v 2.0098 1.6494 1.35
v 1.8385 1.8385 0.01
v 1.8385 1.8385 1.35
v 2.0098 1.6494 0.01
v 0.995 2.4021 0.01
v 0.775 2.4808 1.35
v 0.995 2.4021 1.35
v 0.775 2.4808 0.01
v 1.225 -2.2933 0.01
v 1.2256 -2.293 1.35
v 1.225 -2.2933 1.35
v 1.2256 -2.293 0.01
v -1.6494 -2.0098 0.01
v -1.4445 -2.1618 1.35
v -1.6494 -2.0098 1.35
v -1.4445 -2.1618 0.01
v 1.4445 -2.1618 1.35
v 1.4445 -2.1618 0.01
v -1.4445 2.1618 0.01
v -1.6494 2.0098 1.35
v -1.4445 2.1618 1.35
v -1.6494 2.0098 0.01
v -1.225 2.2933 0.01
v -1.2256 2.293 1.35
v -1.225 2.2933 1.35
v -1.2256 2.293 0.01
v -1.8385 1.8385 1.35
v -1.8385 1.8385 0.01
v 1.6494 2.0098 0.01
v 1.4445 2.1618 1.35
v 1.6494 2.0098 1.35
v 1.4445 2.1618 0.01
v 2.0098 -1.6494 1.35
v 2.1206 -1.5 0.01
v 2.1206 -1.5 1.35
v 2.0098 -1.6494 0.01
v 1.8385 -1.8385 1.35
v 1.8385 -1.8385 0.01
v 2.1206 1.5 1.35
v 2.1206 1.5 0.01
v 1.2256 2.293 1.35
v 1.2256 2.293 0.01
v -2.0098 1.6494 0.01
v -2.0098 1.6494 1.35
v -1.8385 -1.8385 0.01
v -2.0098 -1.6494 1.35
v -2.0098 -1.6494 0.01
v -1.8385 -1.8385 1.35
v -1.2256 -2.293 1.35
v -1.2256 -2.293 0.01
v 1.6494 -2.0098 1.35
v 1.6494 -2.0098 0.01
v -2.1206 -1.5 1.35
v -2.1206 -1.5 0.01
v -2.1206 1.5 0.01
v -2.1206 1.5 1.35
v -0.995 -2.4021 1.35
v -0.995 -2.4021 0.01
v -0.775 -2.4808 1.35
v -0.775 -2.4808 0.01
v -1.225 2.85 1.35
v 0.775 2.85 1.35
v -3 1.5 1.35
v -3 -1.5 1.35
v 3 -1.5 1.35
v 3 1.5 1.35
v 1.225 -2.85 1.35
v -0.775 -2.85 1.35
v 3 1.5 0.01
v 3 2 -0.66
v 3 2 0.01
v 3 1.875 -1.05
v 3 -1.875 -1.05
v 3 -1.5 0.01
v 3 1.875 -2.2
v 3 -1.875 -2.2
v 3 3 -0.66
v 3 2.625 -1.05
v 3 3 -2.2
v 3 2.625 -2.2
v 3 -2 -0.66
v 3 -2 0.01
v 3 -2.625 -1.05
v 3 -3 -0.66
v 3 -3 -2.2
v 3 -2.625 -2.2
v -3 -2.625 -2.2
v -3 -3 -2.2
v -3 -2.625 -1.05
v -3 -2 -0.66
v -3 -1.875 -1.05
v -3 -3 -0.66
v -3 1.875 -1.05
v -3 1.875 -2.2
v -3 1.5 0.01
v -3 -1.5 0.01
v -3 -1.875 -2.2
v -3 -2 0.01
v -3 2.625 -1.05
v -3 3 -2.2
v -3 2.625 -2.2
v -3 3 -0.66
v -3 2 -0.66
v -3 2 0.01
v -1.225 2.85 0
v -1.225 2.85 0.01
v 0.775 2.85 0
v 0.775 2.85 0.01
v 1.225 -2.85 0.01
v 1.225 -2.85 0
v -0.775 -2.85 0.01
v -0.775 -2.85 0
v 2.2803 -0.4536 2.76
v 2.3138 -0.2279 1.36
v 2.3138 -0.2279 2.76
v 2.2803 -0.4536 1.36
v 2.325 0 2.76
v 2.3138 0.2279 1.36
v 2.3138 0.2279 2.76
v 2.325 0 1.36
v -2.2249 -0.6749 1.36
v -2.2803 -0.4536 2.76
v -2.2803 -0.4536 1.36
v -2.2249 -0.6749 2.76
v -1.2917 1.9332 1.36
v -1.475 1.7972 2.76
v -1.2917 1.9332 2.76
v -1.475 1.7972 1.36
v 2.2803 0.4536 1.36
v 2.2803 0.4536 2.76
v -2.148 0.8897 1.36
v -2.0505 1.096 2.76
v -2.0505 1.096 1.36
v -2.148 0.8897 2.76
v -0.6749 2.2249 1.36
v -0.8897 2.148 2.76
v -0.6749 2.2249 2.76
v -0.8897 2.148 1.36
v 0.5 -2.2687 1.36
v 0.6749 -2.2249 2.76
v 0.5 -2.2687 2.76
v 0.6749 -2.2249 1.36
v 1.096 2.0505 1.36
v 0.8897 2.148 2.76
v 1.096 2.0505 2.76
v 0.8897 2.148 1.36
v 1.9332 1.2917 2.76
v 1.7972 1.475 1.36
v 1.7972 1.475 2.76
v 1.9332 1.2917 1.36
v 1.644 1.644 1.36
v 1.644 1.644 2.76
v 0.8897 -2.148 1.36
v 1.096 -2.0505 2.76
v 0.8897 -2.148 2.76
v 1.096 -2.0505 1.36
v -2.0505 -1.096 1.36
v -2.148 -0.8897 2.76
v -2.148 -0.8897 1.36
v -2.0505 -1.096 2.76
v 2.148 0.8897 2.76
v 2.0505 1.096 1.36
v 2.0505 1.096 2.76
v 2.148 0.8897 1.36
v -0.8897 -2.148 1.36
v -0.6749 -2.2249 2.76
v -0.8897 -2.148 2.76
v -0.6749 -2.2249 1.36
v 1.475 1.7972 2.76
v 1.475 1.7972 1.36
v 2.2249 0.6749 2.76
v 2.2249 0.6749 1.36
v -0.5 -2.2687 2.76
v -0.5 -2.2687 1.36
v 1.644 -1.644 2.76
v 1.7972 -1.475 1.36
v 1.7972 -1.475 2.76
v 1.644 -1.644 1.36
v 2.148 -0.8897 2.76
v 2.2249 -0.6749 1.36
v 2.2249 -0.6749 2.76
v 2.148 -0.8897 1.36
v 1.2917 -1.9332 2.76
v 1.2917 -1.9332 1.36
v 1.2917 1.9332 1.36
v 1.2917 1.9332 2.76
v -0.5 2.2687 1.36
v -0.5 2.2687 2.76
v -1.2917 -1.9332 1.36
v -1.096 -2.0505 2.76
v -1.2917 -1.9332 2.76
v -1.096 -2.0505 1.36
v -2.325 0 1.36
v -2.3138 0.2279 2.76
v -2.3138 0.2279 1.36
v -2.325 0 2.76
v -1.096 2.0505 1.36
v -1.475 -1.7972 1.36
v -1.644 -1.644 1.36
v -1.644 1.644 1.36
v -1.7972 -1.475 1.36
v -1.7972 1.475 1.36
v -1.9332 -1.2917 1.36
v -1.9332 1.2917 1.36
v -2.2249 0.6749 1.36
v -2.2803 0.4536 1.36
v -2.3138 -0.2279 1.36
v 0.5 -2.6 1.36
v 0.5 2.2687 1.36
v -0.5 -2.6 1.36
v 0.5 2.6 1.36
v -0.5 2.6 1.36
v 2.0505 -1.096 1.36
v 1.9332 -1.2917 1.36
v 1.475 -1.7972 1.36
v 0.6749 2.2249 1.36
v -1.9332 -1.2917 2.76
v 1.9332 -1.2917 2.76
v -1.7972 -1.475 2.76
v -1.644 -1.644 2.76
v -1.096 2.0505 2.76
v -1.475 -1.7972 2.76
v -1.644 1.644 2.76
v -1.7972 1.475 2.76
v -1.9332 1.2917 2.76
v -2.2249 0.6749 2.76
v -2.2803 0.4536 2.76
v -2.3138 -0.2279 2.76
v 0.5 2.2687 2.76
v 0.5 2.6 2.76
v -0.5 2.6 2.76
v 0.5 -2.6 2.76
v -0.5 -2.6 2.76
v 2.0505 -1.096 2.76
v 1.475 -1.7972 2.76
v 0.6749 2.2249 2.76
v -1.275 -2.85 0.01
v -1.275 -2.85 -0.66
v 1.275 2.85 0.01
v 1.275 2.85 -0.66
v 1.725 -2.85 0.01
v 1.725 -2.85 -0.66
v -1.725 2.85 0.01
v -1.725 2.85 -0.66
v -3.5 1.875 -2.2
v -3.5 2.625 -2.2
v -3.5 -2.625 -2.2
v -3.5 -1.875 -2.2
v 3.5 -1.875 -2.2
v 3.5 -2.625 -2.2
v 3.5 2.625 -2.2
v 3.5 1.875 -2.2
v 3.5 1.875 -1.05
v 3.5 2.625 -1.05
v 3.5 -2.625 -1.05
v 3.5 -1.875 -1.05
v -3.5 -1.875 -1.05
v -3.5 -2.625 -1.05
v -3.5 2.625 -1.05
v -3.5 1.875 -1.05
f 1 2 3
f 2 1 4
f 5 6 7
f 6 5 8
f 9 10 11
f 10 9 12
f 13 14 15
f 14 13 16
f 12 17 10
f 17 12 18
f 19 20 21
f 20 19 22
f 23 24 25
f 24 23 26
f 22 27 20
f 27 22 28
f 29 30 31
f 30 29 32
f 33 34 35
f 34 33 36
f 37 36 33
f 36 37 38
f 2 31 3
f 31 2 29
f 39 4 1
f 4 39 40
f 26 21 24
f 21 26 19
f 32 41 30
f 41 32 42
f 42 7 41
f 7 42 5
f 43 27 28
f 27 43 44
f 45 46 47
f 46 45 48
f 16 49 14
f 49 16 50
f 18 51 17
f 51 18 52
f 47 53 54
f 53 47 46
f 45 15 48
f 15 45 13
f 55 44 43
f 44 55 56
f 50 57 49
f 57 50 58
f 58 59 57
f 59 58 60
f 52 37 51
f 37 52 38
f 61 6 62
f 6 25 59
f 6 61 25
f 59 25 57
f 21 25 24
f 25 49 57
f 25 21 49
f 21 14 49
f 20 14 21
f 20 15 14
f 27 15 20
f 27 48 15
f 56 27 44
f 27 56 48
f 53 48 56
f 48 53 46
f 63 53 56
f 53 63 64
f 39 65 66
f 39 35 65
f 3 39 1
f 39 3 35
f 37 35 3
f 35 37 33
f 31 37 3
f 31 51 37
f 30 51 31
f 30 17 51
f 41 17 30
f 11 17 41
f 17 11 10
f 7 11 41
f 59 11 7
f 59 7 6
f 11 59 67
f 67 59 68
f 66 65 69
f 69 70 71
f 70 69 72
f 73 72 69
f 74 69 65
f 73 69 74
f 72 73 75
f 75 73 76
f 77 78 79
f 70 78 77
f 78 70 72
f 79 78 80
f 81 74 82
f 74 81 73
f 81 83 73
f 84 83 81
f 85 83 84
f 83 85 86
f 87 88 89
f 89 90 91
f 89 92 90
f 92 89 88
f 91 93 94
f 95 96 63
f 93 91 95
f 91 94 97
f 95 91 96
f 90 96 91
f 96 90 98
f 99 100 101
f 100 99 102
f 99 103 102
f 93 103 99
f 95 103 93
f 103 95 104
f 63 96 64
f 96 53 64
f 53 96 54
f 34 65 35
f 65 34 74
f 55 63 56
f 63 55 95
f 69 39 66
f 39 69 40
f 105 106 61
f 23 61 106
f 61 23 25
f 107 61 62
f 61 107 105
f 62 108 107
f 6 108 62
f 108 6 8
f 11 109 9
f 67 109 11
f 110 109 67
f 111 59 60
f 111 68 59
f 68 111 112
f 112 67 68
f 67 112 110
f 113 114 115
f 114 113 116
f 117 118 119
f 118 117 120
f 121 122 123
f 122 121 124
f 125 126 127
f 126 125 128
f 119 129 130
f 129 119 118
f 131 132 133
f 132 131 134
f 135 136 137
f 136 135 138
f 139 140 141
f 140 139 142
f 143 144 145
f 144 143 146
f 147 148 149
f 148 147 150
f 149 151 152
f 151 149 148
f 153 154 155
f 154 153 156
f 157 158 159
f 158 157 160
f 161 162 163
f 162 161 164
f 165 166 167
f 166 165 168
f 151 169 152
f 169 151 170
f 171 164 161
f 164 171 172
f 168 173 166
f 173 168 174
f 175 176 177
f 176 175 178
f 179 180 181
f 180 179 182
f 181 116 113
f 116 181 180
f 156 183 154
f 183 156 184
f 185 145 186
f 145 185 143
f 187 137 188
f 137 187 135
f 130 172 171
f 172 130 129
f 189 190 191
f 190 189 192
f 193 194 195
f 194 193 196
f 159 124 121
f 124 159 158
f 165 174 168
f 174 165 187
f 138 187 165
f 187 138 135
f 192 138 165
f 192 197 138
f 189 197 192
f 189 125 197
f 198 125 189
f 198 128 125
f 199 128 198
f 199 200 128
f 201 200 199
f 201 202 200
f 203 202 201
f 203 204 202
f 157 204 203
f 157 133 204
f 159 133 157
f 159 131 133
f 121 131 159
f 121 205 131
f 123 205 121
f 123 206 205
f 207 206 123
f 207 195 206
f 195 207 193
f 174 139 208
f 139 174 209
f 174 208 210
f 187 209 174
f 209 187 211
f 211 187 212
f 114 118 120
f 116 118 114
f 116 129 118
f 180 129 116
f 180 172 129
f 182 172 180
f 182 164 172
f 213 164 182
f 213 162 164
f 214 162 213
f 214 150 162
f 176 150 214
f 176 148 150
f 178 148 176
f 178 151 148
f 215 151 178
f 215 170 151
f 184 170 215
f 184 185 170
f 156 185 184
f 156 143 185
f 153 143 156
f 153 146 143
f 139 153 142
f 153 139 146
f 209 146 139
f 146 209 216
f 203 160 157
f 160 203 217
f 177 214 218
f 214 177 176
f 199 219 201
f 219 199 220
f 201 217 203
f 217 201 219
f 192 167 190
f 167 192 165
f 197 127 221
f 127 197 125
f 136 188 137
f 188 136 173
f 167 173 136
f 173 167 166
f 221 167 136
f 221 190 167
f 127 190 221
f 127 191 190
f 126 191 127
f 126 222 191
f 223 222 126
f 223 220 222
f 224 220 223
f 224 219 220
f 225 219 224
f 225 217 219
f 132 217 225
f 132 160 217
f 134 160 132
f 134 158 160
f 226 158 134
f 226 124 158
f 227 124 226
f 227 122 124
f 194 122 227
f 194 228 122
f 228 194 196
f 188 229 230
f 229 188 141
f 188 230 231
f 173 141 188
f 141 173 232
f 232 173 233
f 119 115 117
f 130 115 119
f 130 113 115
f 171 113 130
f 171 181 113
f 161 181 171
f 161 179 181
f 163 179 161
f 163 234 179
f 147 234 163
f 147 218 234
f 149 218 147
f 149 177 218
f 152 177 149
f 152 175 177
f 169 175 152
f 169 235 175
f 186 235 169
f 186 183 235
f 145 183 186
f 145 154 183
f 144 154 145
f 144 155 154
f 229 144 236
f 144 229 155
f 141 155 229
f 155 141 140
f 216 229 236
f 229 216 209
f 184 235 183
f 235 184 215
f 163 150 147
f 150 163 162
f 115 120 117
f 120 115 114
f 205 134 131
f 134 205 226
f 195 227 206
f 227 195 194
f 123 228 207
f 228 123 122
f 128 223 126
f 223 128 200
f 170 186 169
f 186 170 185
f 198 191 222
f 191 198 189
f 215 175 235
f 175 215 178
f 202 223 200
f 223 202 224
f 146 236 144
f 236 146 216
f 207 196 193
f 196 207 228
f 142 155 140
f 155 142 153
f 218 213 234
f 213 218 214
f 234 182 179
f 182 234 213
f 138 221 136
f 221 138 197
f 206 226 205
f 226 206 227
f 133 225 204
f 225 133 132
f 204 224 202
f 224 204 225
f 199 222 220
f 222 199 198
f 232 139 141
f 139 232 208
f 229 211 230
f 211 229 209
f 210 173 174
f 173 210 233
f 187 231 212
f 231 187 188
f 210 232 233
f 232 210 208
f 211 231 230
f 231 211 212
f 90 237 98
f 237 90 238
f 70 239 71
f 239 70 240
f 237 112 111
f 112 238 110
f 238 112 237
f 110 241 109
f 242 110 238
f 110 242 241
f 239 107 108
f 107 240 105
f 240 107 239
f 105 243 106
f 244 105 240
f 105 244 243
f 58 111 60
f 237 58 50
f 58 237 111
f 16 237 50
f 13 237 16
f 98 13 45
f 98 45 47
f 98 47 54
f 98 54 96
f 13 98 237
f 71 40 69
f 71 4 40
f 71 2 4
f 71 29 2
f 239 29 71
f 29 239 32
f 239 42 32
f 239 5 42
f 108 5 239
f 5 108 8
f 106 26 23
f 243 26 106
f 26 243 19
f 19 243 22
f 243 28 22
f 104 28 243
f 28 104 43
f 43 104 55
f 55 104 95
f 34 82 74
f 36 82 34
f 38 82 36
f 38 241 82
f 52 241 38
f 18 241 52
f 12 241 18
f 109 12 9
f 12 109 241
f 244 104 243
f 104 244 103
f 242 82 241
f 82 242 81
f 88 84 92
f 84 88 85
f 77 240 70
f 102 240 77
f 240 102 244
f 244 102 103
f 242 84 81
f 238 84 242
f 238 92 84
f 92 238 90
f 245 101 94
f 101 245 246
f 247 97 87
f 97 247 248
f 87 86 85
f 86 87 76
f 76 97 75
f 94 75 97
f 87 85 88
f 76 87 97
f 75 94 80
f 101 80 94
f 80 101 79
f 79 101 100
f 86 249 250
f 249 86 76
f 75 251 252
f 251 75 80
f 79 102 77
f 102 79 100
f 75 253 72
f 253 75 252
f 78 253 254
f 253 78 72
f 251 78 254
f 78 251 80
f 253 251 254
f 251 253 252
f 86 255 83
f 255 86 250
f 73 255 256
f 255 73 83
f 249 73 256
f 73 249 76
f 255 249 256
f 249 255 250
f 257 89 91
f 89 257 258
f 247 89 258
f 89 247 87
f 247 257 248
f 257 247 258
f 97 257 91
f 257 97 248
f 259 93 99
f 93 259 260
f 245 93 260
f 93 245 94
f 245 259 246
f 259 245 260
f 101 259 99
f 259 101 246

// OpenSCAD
// Start: lazy_union
default_5_default_5();
// End: lazy_union

// Modules.

// 'PartMaterial undef-default - default 5.0'
module default_5_default_5() {
  // 'None : _combine_solids_and_holes'
  union() {
    // 'default : _combine_solids_and_holes'
    union() {
      // 'post'
      multmatrix(m=[[1.0, 0.0, 0.0, 0.0], [-0.0, -1.0, -0.0, -0.0], [-0.0, -0.0, -1.0, 0.6749999999999998], [0.0, 0.0, 0.0, 1.0]]) {
        // 'post : _combine_solids_and_holes'
        union() {
          // 'master'
          multmatrix(m=[[1.0, 0.0, 0.0, 0.0], [-0.0, -1.0, -0.0, -0.0], [-0.0, -0.0, -1.0, 0.6749999999999998], [0.0, 0.0, 0.0, 1.0]]) {
            // 'master : _combine_solids_and_holes'
            union() {
              // 'master'
              cylinder(h=1.3499999999999996, r1=2.6, r2=2.6, center=false, $fn=64);
            }
          }
          // 'block1'
          multmatrix(m=[[1.0, 0.0, 0.0, -3.0], [0.0, 1.0, 0.0, -1.5], [0.0, 0.0, 1.0, -0.6749999999999998], [0.0, 0.0, 0.0, 1.0]]) {
            // 'block1 : _combine_solids_and_holes'
            union() {
              // 'block1'
              cube(size=[6.0, 3.0, 1.3499999999999996]);
            }
          }
          // ('block2', 0)
          multmatrix(m=[[1.0, 0.0, 0.0, -1.225], [-0.0, -1.0, -0.0, -0.0], [-0.0, -0.0, -1.0, 0.6749999999999998], [0.0, 0.0, 0.0, 1.0]]) {
            // "('block2', 0) : _combine_solids_and_holes"
            union() {
              // ('block2', 0)
              cube(size=[2.0, 2.85, 1.3499999999999996]);
            }
          }
          // ('block2', 1)
          multmatrix(m=[[1.0, 0.0, 0.0, -0.7749999999999999], [0.0, 1.0, 0.0, 0.0], [0.0, 0.0, 1.0, -0.6749999999999998], [0.0, 0.0, 0.0, 1.0]]) {
            // "('block2', 1) : _combine_solids_and_holes"
            union() {
              // ('block2', 1)
              cube(size=[2.0, 2.85, 1.3499999999999996]);
            }
          }
        }
      }
      // 'plunger'
      multmatrix(m=[[1.0, 0.0, 0.0, 0.0], [0.0, -1.0, 0.0, 0.0], [0.0, 0.0, -1.0, 2.0599999999999996], [0.0, 0.0, 0.0, 1.0]]) {
        // 'plunger : _combine_solids_and_holes'
        union() {
          // 'plunger'
          multmatrix(m=[[1.0, 0.0, 0.0, 0.0], [-0.0, -1.0, -0.0, -0.0], [-0.0, -0.0, -1.0, 0.7], [0.0, 0.0, 0.0, 1.0]]) {
            // 'plunger : _combine_solids_and_holes'
            union() {
              // 'plunger'
              cylinder(h=1.4, r1=2.325, r2=2.325, center=false, $fn=64);
            }
          }
          // 'tab'
          multmatrix(m=[[1.0, 0.0, 0.0, -0.5], [0.0, 1.0, 0.0, -2.6], [0.0, 0.0, 1.0, -0.7], [0.0, 0.0, 0.0, 1.0]]) {
            // 'tab : _combine_solids_and_holes'
            union() {
              // 'tab'
              cube(size=[1.0, 5.2, 1.4]);
            }
          }
        }
      }
      // 'centre_plate'
      multmatrix(m=[[0.0, 0.0, 1.0, -3.0], [-1.0, 0.0, 0.0, 2.0], [0.0, -1.0, 0.0, 0.01], [0.0, 0.0, 0.0, 1.0]]) {
        // 'centre_plate : _combine_solids_and_holes'
        union() {
          // 'centre_plate'
          multmatrix(m=[[-0.0, -1.0, -0.0, 2.0], [0.0, 0.0, 1.0, 0.0], [-1.0, -0.0, -0.0, 3.0], [0.0, 0.0, 0.0, 1.0]]) {
            // 'centre_plate : _combine_solids_and_holes'
            union() {
              // 'centre_plate'
              linear_extrude(height=0.6800000000000002, twist=0.0, slices=4, scale=[1.0, 1.0], $fn=64) {
                polygon(points=[[3.0, 2.0], [3.0, -2.0], [1.275, -2.85], [-1.725, -2.85], [-3.0, -2.0], [-3.0, 2.0], [-1.275, 2.85], [1.725, 2.85]]);
              }
            }
          }
        }
      }
      // 'base_plate'
      multmatrix(m=[[0.0, 1.0, 0.0, -3.0], [-1.0, 0.0, 0.0, 3.0], [0.0, 0.0, 1.0, -2.2], [0.0, 0.0, 0.0, 1.0]]) {
        // 'base_plate : _combine_solids_and_holes'
        union() {
          // 'base_plate'
          cube(size=[6.0, 6.0, 1.54]);
        }
      }
      // ('terminal', 0)
      multmatrix(m=[[0.0, 1.0, 0.0, 2.7], [-1.0, 0.0, 0.0, 2.25], [0.0, 0.0, 1.0, -1.6250000000000002], [0.0, 0.0, 0.0, 1.0]]) {
        // "('terminal', 0) : _combine_solids_and_holes"
        union() {
          // 'terminal'
          multmatrix(m=[[1.0, 0.0, 0.0, -0.375], [0.0, 1.0, 0.0, -0.8], [0.0, 0.0, 1.0, -0.575], [0.0, 0.0, 0.0, 1.0]]) {
            // 'terminal'
            color(c=[0.7529411764705882, 0.7529411764705882, 0.7529411764705882, 1.0]) {
              // 'terminal : _combine_solids_and_holes'
              union() {
                // 'terminal'
                cube(size=[0.75, 1.6, 1.15]);
              }
            }
          }
        }
      }
      // ('terminal', 1)
      multmatrix(m=[[0.0, 1.0, 0.0, 2.7], [-1.0, 0.0, 0.0, -2.25], [0.0, 0.0, 1.0, -1.6250000000000002], [0.0, 0.0, 0.0, 1.0]]) {
        // "('terminal', 1) : _combine_solids_and_holes"
        union() {
          // 'terminal'
          multmatrix(m=[[1.0, 0.0, 0.0, -0.375], [0.0, 1.0, 0.0, -0.8], [0.0, 0.0, 1.0, -0.575], [0.0, 0.0, 0.0, 1.0]]) {
            // 'terminal'
            color(c=[0.7529411764705882, 0.7529411764705882, 0.7529411764705882, 1.0]) {
              // 'terminal : _combine_solids_and_holes'
              union() {
                // 'terminal'
                cube(size=[0.75, 1.6, 1.15]);
              }
            }
          }
        }
      }
      // ('terminal', 2)
      multmatrix(m=[[0.0, -1.0, 0.0, -2.7], [1.0, 0.0, 0.0, -2.25], [0.0, 0.0, 1.0, -1.6250000000000002], [0.0, 0.0, 0.0, 1.0]]) {
        // "('terminal', 2) : _combine_solids_and_holes"
        union() {
          // 'terminal'
          multmatrix(m=[[1.0, 0.0, 0.0, -0.375], [0.0, 1.0, 0.0, -0.8], [0.0, 0.0, 1.0, -0.575], [0.0, 0.0, 0.0, 1.0]]) {
            // 'terminal'
            color(c=[0.7529411764705882, 0.7529411764705882, 0.7529411764705882, 1.0]) {
              // 'terminal : _combine_solids_and_holes'
              union() {
                // 'terminal'
                cube(size=[0.75, 1.6, 1.15]);
              }
            }
          }
        }
      }
      // ('terminal', 3)
      multmatrix(m=[[0.0, -1.0, 0.0, -2.7], [1.0, 0.0, 0.0, 2.25], [0.0, 0.0, 1.0, -1.6250000000000002], [0.0, 0.0, 0.0, 1.0]]) {
        // "('terminal', 3) : _combine_solids_and_holes"
        union() {
          // 'terminal'
          multmatrix(m=[[1.0, 0.0, 0.0, -0.375], [0.0, 1.0, 0.0, -0.8], [0.0, 0.0, 1.0, -0.575], [0.0, 0.0, 0.0, 1.0]]) {
            // 'terminal'
            color(c=[0.7529411764705882, 0.7529411764705882, 0.7529411764705882, 1.0]) {
              // 'terminal : _combine_solids_and_holes'
              union() {
                // 'terminal'
                cube(size=[0.75, 1.6, 1.15]);
              }
            }
          }
        }
      }
    }
  }
} // end module default_5_default_5
